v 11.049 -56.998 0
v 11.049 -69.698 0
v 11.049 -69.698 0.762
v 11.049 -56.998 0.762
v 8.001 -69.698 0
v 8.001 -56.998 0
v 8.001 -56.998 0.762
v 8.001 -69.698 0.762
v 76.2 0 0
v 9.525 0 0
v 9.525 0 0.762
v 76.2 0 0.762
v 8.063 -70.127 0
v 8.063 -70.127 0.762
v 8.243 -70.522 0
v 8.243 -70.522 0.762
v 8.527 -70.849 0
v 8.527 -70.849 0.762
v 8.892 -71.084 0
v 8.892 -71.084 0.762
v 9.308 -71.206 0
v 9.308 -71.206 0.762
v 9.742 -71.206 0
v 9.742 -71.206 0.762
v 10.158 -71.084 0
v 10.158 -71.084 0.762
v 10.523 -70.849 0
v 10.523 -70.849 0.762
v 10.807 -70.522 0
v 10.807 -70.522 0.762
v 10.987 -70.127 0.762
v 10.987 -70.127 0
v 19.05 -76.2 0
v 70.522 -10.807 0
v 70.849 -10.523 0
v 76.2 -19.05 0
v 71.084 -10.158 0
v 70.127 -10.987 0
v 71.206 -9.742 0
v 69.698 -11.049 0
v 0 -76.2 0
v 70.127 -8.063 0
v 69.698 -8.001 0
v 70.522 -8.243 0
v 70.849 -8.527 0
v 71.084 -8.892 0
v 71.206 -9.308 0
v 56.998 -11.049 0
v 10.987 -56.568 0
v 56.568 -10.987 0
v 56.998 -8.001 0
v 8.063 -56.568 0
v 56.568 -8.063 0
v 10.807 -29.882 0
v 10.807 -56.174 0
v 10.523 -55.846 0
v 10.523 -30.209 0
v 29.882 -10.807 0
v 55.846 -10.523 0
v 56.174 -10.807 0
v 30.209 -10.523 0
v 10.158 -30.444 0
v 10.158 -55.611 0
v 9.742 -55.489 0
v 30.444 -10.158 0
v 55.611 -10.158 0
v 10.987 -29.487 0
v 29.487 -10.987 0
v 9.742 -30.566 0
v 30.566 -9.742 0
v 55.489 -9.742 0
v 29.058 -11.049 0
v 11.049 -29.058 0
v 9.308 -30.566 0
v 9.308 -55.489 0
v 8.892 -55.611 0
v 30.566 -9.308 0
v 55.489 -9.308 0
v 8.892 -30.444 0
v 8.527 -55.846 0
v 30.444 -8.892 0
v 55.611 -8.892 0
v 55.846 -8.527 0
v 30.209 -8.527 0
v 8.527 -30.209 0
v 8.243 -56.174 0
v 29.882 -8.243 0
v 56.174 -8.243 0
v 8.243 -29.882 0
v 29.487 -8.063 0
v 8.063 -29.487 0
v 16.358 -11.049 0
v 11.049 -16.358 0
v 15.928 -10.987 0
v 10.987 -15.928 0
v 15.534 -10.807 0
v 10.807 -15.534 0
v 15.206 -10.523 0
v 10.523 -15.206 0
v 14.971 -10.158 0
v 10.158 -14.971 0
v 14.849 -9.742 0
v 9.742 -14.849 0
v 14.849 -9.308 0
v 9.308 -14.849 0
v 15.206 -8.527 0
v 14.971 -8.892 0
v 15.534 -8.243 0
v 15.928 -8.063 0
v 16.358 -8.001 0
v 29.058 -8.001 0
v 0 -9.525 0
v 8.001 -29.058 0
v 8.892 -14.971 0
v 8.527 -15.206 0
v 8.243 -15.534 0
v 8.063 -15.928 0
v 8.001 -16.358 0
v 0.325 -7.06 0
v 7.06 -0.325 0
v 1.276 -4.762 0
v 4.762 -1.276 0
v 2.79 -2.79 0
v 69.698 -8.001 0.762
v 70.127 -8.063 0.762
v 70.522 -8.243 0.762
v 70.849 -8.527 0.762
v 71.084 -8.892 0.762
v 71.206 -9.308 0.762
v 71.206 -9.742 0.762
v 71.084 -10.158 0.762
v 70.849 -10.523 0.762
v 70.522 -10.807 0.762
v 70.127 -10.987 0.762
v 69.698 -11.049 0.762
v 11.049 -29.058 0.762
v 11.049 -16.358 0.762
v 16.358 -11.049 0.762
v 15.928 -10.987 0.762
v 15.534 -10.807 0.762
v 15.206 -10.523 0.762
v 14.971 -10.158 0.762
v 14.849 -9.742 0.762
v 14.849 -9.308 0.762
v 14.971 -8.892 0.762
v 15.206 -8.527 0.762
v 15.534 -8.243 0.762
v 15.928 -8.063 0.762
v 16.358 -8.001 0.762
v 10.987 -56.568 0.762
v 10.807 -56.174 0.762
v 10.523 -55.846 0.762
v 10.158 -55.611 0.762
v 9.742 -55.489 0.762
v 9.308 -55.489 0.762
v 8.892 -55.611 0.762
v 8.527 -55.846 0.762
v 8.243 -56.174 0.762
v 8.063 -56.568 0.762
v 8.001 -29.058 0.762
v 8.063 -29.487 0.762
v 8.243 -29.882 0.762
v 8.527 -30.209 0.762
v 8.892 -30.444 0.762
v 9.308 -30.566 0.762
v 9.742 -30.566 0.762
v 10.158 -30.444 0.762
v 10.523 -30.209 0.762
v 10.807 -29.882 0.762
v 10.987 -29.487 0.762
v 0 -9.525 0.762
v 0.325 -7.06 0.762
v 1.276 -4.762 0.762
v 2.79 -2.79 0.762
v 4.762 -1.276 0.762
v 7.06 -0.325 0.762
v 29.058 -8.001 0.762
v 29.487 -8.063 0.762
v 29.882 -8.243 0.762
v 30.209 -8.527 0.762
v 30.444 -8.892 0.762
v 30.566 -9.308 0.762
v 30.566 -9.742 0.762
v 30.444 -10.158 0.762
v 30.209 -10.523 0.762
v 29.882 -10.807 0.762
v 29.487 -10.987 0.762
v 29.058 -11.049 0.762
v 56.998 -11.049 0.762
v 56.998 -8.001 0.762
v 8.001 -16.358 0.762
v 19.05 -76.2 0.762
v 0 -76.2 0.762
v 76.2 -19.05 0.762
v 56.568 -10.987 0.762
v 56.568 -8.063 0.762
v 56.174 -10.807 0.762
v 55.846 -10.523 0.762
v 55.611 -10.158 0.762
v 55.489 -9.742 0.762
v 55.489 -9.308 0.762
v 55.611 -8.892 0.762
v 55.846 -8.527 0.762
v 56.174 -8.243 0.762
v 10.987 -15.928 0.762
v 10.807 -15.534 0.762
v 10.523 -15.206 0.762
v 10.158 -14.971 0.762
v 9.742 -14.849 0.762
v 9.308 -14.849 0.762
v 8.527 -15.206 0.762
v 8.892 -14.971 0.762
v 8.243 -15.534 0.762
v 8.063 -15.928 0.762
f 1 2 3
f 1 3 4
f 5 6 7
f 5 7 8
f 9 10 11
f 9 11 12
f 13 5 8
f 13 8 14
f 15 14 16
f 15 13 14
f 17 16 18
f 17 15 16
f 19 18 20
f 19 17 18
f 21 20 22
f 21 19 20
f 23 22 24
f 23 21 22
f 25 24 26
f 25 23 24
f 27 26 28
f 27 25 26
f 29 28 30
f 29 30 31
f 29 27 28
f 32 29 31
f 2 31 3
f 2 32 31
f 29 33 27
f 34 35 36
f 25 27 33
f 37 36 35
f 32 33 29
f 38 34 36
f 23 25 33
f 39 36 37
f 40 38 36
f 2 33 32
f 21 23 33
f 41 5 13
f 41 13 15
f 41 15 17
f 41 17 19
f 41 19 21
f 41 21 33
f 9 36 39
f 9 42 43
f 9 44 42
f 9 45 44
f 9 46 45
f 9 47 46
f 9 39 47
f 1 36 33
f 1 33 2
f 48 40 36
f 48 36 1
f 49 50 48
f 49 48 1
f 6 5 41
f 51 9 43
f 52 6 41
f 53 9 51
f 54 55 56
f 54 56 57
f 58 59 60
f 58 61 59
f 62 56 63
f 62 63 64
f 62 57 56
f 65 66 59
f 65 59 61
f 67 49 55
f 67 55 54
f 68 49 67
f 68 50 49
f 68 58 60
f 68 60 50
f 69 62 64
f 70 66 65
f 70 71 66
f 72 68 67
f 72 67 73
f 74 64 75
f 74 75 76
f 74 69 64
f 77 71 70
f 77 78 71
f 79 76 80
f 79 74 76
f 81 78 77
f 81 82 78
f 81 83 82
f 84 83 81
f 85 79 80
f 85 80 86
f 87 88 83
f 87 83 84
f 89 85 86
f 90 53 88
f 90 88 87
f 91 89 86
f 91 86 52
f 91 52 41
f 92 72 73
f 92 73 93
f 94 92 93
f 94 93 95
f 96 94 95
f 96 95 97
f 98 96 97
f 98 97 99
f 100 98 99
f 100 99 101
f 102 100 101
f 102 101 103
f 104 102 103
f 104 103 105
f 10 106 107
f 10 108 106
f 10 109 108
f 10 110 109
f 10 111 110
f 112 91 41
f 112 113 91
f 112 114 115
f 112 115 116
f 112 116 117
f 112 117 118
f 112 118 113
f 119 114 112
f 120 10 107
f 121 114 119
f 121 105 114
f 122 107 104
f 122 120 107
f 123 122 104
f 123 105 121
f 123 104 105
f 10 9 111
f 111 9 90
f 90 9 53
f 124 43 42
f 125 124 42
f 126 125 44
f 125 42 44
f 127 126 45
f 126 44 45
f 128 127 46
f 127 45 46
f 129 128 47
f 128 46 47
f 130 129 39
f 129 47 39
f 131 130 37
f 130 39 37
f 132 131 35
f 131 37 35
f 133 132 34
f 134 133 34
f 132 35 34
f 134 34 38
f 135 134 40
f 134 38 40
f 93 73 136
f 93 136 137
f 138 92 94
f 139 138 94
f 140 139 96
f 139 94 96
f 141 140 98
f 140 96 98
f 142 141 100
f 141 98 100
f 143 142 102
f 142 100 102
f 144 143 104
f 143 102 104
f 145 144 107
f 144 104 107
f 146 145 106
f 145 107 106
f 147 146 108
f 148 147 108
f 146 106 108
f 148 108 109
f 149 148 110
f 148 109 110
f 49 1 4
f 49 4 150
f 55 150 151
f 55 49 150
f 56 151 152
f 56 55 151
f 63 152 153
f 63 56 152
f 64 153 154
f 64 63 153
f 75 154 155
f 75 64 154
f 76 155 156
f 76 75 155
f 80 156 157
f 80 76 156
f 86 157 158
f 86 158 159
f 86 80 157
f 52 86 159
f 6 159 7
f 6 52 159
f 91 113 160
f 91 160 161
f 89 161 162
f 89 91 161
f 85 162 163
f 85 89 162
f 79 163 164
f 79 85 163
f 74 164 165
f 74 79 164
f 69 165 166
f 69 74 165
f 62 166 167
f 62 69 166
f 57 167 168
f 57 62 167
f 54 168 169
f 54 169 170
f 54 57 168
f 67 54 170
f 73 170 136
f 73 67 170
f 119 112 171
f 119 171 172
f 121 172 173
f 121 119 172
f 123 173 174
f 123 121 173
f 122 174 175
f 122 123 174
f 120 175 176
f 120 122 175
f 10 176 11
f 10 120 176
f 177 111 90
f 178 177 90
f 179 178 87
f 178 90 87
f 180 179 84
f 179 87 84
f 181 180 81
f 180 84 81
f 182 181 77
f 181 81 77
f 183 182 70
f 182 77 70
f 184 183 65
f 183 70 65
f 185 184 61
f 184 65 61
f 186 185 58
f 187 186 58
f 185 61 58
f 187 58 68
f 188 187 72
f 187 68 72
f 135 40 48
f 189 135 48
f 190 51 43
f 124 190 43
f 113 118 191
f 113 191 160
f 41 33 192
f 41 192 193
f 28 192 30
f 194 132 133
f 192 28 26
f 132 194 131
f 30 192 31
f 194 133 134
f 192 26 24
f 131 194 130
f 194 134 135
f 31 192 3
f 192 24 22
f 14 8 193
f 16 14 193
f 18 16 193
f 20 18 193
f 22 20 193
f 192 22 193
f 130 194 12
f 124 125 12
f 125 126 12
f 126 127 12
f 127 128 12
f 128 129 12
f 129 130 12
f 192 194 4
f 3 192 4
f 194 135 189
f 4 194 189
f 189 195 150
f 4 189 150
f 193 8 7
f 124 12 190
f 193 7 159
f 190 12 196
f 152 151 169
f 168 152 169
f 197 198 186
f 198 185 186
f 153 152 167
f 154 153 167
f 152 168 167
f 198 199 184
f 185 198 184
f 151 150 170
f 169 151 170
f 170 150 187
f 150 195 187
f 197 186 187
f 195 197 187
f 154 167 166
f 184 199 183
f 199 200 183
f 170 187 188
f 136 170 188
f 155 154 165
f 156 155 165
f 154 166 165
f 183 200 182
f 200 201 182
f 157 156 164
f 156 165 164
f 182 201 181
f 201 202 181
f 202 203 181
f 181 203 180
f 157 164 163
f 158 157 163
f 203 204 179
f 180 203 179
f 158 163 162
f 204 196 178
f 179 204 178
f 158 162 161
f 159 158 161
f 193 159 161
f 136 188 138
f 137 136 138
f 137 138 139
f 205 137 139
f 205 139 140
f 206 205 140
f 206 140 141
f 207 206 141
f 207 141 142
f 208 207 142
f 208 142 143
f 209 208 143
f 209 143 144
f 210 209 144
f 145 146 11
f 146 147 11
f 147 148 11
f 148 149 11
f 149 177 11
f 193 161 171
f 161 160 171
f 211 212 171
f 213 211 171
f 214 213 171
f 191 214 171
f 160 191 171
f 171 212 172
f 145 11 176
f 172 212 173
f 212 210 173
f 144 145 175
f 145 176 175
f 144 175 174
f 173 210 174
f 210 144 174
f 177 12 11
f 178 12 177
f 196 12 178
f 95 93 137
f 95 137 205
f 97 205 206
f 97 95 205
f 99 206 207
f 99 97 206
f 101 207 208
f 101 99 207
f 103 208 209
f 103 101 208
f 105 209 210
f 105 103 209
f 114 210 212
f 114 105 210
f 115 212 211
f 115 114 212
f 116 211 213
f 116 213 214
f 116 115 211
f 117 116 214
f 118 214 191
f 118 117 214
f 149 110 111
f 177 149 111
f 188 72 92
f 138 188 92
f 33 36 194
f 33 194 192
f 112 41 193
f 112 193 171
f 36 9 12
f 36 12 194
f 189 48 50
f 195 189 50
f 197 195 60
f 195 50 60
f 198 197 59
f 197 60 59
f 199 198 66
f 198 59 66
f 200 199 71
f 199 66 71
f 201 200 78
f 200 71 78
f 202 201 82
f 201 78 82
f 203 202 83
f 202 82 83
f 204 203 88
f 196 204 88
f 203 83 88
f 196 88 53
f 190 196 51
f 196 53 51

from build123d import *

# Parameters (mm, degrees)
BOSS_EXTRUDE1_DEPTH = 0.762


with BuildPart() as part:
    # Sketch1 → Boss-Extrude1 (new body)
    with BuildSketch(Plane.XY):
        with BuildLine():
            Line((0, -76.2), (0, -9.525))
            ThreePointArc((0, -9.525), (2.789807909, -2.789807909), (9.525, 0))
            Line((9.525, 0), (76.2, 0))
            Line((76.2, 0), (76.2, -19.05))
            Line((76.2, -19.05), (19.05, -76.2))
            Line((19.05, -76.2), (0, -76.2))
        make_face()
        with BuildLine():
            Line((56.9976, -8.001), (69.6976, -8.001))
            ThreePointArc((69.6976, -8.001), (71.2216, -9.525), (69.6976, -11.049))
            Line((69.6976, -11.049), (56.9976, -11.049))
            ThreePointArc((56.9976, -11.049), (55.4736, -9.525), (56.9976, -8.001))
        make_face(mode=Mode.SUBTRACT)
        with BuildLine():
            Line((8.001, -56.9976), (8.001, -69.6976))
            ThreePointArc((8.001, -69.6976), (9.525, -71.2216), (11.049, -69.6976))
            Line((11.049, -69.6976), (11.049, -56.9976))
            ThreePointArc((11.049, -56.9976), (9.525, -55.4736), (8.001, -56.9976))
        make_face(mode=Mode.SUBTRACT)
        with BuildLine():
            Line((29.0576, -11.049), (16.3576, -11.049))
            ThreePointArc((16.3576, -11.049), (14.8336, -9.525), (16.3576, -8.001))
            Line((16.3576, -8.001), (29.0576, -8.001))
            ThreePointArc((29.0576, -8.001), (30.5816, -9.525), (29.0576, -11.049))
        make_face(mode=Mode.SUBTRACT)
        with BuildLine():
            Line((11.049, -29.0576), (11.049, -16.3576))
            ThreePointArc((11.049, -16.3576), (9.525, -14.8336), (8.001, -16.3576))
            Line((8.001, -16.3576), (8.001, -29.0576))
            ThreePointArc((8.001, -29.0576), (9.525, -30.5816), (11.049, -29.0576))
        make_face(mode=Mode.SUBTRACT)
    extrude(amount=BOSS_EXTRUDE1_DEPTH)


solid = part.part
